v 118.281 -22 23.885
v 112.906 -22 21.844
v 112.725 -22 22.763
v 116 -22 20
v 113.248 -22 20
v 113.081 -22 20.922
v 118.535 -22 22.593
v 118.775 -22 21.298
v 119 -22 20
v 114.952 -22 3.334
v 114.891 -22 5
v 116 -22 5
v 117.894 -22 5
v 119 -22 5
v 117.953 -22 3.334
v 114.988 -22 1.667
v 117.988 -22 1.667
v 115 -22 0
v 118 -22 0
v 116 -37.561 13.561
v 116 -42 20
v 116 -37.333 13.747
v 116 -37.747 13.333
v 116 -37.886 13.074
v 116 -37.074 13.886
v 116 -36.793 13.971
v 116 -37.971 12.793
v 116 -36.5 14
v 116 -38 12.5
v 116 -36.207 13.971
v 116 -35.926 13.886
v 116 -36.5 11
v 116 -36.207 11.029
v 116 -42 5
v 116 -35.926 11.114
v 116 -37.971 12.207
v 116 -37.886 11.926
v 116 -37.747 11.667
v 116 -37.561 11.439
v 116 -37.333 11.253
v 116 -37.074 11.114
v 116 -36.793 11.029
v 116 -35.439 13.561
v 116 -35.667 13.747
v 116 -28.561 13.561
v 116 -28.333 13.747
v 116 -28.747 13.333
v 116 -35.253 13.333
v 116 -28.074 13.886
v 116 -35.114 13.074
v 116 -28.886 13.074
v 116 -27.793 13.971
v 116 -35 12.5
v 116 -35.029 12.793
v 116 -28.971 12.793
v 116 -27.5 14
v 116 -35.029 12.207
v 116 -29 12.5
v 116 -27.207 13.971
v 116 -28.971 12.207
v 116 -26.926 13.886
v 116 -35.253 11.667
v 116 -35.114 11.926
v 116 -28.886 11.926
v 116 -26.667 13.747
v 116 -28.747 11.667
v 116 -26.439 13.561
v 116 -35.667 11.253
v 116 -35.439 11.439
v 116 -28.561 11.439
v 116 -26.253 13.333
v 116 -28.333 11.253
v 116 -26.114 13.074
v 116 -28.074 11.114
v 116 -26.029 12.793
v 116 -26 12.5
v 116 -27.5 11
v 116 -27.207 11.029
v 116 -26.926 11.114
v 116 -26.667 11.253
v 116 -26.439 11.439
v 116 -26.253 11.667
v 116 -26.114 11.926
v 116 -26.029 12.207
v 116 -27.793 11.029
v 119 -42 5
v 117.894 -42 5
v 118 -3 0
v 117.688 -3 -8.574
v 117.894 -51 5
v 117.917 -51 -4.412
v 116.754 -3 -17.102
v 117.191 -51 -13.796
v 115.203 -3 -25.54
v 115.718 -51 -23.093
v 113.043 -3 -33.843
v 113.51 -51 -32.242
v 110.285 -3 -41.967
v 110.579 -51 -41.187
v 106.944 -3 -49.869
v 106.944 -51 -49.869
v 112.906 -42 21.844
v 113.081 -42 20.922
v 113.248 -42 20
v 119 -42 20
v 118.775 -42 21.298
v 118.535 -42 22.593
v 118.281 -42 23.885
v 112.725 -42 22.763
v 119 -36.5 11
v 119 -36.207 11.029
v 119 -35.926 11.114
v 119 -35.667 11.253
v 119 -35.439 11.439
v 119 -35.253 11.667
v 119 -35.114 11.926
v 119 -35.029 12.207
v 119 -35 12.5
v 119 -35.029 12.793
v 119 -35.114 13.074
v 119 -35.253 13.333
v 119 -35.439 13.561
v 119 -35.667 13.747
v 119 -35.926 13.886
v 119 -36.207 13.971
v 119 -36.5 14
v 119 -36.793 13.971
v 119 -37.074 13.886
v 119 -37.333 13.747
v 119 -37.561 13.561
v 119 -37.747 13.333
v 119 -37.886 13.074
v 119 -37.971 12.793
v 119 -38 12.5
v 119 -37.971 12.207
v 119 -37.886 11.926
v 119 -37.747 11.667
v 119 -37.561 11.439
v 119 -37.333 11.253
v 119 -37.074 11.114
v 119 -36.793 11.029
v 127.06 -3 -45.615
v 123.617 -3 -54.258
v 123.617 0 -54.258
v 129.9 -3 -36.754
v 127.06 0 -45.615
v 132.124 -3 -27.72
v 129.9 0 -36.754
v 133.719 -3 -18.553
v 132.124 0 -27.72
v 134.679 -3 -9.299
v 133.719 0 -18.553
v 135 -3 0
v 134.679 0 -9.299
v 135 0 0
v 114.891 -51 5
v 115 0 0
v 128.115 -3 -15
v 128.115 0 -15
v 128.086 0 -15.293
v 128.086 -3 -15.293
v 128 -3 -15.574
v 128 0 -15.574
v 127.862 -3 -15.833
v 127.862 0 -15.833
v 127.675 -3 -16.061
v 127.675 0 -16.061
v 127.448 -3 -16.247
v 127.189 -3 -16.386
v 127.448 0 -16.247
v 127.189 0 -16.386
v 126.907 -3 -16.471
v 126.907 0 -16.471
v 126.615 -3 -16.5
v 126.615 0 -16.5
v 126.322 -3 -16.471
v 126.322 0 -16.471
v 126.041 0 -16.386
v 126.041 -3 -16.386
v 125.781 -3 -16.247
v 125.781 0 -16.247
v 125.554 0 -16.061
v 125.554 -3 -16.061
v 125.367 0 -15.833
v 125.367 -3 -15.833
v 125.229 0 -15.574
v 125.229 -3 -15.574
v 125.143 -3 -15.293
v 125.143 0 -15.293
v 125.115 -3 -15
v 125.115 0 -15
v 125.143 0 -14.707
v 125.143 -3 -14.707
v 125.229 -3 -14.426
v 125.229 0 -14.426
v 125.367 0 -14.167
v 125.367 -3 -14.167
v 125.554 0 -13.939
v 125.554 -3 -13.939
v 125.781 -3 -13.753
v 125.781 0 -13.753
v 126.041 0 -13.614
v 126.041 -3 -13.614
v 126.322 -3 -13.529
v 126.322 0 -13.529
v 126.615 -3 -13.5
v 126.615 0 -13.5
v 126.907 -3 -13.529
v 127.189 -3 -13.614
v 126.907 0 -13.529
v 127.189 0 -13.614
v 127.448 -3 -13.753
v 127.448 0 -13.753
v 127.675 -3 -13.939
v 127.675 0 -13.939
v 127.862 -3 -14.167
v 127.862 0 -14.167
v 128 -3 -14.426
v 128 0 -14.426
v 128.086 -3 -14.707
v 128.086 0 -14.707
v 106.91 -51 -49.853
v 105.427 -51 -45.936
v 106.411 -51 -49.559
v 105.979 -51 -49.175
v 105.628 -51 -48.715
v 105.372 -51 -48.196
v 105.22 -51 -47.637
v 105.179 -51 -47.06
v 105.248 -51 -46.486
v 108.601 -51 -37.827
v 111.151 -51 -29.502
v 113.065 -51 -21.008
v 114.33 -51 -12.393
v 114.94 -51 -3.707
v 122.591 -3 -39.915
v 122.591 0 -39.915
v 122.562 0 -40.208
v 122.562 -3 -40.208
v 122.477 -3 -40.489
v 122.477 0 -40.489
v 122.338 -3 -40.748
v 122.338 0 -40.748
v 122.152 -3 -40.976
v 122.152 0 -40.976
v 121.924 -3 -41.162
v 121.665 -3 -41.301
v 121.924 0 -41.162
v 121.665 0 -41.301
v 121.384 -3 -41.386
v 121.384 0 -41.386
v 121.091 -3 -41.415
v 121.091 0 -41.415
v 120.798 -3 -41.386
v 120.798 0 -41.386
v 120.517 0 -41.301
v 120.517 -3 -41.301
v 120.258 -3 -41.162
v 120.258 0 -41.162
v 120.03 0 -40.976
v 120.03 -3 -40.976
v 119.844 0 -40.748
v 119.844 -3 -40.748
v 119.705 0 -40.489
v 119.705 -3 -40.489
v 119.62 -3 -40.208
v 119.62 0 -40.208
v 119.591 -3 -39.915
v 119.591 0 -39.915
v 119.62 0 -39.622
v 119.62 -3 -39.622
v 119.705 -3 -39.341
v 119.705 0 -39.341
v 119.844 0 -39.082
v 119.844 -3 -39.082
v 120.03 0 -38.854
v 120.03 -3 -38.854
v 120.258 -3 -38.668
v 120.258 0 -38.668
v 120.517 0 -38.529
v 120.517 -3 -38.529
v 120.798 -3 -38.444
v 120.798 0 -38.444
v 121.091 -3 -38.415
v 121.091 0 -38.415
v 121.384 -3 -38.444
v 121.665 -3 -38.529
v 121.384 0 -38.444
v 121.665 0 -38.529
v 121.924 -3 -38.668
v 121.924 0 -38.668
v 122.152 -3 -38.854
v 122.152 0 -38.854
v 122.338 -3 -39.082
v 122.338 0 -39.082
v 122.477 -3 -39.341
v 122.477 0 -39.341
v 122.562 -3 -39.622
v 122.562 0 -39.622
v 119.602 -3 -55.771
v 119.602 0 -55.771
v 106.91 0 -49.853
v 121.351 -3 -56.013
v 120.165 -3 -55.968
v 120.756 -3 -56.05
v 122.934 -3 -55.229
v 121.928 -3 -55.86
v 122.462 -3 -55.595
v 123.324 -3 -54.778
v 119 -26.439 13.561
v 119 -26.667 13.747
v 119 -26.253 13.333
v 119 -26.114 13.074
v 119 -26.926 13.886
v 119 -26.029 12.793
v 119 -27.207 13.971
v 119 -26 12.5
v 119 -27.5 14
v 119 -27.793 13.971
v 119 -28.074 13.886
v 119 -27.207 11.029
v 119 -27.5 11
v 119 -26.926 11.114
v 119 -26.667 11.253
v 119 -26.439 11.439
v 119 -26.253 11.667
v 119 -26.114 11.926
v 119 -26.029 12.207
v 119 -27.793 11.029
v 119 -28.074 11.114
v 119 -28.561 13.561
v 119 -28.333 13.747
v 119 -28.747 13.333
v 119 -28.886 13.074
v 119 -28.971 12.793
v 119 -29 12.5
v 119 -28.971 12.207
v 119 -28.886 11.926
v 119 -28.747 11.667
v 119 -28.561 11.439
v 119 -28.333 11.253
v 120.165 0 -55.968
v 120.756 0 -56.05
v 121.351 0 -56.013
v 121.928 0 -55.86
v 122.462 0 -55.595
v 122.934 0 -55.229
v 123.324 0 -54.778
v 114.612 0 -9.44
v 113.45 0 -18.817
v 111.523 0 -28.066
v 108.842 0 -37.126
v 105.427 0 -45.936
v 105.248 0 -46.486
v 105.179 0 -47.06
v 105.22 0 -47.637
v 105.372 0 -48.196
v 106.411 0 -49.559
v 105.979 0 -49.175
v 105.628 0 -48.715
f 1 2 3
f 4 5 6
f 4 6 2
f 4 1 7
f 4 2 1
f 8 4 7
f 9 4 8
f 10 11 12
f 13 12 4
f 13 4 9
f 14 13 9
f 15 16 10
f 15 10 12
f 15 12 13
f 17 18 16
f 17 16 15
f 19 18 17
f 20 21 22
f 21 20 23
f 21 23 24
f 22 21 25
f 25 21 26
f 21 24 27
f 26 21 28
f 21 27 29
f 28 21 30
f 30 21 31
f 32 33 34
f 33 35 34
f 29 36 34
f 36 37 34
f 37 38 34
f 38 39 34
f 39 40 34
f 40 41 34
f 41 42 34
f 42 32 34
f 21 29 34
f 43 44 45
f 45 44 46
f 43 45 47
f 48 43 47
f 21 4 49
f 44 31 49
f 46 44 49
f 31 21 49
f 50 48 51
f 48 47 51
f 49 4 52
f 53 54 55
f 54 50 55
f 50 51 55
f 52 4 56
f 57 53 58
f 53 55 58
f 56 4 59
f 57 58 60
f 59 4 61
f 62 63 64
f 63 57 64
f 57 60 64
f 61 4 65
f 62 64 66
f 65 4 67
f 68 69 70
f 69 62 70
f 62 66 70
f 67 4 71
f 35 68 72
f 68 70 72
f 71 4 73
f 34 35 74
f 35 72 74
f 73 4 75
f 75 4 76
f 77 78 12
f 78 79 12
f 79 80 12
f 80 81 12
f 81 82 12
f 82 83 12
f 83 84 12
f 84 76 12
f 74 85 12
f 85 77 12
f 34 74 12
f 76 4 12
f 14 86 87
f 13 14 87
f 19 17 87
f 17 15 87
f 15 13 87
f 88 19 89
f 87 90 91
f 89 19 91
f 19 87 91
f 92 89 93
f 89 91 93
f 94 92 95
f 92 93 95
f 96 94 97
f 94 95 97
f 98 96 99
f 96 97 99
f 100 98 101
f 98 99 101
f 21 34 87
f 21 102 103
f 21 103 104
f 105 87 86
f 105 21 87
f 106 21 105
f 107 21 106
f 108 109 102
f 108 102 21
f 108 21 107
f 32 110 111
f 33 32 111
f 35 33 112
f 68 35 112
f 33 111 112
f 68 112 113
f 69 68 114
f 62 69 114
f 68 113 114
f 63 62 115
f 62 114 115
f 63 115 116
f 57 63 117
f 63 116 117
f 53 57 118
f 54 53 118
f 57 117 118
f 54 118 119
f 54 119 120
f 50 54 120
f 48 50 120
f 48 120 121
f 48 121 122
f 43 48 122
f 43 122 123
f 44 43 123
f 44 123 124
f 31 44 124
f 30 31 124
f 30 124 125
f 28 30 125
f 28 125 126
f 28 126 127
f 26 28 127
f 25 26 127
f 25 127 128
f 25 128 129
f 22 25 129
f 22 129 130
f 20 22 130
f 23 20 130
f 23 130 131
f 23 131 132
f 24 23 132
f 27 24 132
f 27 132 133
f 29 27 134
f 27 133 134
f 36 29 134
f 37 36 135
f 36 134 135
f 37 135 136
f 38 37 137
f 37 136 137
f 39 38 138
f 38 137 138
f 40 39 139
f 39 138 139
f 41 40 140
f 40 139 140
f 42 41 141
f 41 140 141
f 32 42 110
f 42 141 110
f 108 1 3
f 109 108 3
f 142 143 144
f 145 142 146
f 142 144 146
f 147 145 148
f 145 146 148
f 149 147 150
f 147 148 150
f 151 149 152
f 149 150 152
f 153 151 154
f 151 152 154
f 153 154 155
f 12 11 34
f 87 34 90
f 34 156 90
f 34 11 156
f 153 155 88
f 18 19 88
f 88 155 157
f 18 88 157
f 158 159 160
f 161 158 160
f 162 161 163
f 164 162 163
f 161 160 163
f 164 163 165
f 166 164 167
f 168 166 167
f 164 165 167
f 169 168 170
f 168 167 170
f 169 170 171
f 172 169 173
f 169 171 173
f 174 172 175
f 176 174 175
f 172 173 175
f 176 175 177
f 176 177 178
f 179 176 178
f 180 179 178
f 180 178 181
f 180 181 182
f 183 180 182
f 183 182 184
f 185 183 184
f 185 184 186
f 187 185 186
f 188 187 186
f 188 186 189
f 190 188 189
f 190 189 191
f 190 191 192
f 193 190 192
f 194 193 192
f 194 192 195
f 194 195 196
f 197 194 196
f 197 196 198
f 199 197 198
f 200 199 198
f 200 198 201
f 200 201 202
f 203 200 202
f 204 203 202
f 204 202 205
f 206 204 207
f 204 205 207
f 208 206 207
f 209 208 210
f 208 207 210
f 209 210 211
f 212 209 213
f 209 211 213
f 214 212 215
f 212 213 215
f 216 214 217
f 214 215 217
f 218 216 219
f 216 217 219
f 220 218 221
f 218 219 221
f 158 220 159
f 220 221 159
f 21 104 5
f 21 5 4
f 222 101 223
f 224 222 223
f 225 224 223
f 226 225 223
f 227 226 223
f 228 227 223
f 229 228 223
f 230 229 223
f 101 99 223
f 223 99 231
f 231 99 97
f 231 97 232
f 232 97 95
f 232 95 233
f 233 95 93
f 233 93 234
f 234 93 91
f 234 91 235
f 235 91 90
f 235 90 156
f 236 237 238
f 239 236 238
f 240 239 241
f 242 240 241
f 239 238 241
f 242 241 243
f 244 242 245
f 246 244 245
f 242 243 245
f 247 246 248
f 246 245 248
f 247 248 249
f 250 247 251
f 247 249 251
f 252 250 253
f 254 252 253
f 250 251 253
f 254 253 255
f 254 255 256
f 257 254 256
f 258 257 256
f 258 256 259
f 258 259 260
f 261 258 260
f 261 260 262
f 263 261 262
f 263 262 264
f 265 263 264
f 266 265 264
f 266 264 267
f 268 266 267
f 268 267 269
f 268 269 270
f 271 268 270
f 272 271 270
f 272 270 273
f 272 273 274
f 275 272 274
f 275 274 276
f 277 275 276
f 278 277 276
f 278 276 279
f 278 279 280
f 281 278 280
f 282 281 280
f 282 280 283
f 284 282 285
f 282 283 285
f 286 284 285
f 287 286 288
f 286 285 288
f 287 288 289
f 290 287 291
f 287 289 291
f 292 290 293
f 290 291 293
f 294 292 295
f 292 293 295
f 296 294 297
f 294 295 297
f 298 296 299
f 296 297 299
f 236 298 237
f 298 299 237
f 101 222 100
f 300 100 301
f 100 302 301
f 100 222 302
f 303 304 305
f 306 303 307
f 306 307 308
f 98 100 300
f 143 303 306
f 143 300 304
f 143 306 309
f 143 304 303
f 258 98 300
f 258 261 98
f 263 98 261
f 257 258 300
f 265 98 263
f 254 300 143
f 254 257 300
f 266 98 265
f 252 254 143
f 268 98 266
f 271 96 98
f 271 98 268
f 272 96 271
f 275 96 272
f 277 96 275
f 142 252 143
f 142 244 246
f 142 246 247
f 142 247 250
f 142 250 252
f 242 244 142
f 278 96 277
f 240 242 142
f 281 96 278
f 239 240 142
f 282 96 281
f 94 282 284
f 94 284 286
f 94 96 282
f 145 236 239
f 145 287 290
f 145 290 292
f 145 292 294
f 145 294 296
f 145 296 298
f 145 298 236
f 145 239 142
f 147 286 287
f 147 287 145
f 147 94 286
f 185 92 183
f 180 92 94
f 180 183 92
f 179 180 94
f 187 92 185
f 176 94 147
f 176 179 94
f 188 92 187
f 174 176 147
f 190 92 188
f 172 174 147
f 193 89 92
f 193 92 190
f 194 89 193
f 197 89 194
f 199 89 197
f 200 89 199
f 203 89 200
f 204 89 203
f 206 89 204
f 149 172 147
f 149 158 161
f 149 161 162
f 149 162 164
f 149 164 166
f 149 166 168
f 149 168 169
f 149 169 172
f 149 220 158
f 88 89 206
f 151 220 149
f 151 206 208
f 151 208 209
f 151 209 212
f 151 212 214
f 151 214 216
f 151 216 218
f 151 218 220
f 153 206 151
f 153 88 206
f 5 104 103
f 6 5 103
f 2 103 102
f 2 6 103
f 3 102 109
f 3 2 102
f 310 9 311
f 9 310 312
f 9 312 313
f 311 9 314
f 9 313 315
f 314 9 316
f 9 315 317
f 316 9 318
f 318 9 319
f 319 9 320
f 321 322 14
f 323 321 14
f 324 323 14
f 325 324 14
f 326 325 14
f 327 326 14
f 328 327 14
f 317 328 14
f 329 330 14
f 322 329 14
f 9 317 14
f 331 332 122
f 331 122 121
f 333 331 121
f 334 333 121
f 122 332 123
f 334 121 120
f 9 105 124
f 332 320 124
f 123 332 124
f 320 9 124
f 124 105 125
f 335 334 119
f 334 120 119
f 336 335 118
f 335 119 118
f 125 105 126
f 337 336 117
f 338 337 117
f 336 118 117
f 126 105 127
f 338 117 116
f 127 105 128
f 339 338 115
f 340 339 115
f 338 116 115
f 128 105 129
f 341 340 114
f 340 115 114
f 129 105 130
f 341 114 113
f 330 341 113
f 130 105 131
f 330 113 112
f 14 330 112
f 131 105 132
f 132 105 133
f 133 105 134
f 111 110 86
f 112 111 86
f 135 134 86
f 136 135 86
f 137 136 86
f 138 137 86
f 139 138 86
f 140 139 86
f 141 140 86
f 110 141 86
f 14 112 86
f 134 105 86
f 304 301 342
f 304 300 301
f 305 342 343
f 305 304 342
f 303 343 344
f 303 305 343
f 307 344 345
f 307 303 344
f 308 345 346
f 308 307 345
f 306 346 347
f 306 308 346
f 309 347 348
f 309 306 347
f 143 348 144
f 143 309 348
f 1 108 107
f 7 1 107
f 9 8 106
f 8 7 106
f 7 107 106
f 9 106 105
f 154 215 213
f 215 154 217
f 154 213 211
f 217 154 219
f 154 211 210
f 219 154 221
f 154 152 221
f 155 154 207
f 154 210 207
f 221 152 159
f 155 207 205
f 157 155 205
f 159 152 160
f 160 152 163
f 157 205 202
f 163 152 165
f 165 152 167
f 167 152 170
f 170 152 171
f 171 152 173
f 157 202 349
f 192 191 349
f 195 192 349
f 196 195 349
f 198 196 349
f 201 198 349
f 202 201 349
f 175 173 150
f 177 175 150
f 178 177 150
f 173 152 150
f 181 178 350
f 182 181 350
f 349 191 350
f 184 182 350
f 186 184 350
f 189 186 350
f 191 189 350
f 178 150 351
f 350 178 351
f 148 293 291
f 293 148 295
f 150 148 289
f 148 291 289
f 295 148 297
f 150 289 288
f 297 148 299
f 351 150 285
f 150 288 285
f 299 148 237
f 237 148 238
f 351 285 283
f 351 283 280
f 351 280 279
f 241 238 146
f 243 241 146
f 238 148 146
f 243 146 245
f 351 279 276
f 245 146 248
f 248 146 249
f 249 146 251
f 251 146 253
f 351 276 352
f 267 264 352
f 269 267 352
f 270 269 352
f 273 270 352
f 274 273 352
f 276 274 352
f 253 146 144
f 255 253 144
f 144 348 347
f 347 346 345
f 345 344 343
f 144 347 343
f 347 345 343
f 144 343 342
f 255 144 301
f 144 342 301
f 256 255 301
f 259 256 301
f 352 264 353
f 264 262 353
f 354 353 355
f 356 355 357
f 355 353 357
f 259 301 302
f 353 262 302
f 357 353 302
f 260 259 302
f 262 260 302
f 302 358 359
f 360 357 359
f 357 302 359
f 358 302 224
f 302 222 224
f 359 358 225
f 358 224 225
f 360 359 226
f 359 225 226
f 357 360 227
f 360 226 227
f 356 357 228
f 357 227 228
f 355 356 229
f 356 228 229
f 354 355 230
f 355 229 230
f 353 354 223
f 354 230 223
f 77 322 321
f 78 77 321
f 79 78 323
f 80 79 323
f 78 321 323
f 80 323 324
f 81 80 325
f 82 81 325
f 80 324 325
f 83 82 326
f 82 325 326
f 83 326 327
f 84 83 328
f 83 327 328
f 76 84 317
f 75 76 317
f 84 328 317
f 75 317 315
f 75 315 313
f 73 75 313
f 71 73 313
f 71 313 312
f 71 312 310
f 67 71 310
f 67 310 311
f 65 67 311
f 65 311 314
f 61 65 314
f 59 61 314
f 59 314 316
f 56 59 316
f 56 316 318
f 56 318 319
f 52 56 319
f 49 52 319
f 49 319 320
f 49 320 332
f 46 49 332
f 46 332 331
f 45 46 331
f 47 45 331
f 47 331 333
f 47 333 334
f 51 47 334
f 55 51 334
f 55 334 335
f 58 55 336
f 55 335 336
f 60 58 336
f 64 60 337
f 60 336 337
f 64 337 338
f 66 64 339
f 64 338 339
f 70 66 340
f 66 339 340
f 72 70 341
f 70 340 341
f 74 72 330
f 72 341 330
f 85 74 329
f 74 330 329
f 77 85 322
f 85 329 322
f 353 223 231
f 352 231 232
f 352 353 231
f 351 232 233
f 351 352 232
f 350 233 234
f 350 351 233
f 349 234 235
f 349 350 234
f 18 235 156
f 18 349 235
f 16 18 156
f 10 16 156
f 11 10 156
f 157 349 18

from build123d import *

# Parameters (mm, degrees)
EXTRUDE_1_DEPTH      = 64
CUT_EXTRUDE_1_DEPTH  = 64
SKETCH_4_W           = 3
SKETCH_4_H           = 15
CUT_EXTRUDE_2_DEPTH  = 84
CUT_EXTRUDE_3_DEPTH  = 61
CUT_EXTRUDE_4_DEPTH  = 22
CUT_EXTRUDE_5_DEPTH  = 22
FILLET_1_R           = 3
SKETCH_8_R           = 1.5
CUT_EXTRUDE_8_DEPTH  = 10
CUT_EXTRUDE_9_DEPTH  = 13
SKETCH_10_R          = 1.5
CUT_EXTRUDE_10_DEPTH = 10
FILLET_2_R           = 3


with BuildPart() as part:
    # 草图2 → 凸台-拉伸1 (new body)
    with BuildSketch(Plane(origin=(0, 0, 0), x_dir=(1, 0, 0), z_dir=(0, 1, 0))):
        with BuildLine():
            Line((0, 0), (122.35155125, 57.053465335))
            ThreePointArc((122.35155125, 57.053465335), (134.052652215, 15.965163138), (132.328890593, -26.721989344))
            Line((132.328890593, -26.721989344), (0, 0))
        make_face()
    extrude(amount=-EXTRUDE_1_DEPTH)

    # 草图3 → 切除-拉伸1 (cut)
    with BuildSketch(Plane(origin=(0, 0, 0), x_dir=(1, 0, 0), z_dir=(0, 1, 0))):
        with BuildLine():
            Line((0, 0), (104.225395509, 48.6011001))
            ThreePointArc((104.225395509, 48.6011001), (114.193000035, 13.599953785), (112.724610505, -22.763176108))
            Line((112.724610505, -22.763176108), (0, 0))
        make_face()
    extrude(amount=-CUT_EXTRUDE_1_DEPTH, mode=Mode.SUBTRACT)

    # 草图4 → 切除-拉伸2 (cut)
    with BuildSketch(Plane(origin=(0, 0, 0), x_dir=(1, 0, 0), z_dir=(0, 1, 0))):
        with Locations((114.5, -12.5)):
            Rectangle(SKETCH_4_W, SKETCH_4_H)
    extrude(amount=-CUT_EXTRUDE_2_DEPTH, mode=Mode.SUBTRACT)

    # 草图5 → 切除-拉伸3 (cut)
    with BuildSketch(Plane.XZ.offset(64)):
        with BuildLine():
            Line((132.328890593, 26.721989344), (118.281412986, 23.885295518))
            ThreePointArc((118.281412986, 23.885295518), (118.656610088, 21.945589136), (119, 20))
            Line((119, 20), (119, 5))
            Line((119, 5), (117.894020205, 5))
            ThreePointArc((117.894020205, 5), (115.718279593, -23.092851014), (106.94431887, -49.868954885))
            Line((106.94431887, -49.868954885), (122.35155125, -57.053465335))
            ThreePointArc((122.35155125, -57.053465335), (134.052652215, -15.965163138), (132.328890593, 26.721989344))
        make_face()
    extrude(amount=-CUT_EXTRUDE_3_DEPTH, mode=Mode.SUBTRACT)

    # 草图6 → 切除-拉伸4 (cut)
    with BuildSketch(Plane(origin=(0, 0, 0), x_dir=(1, 0, 0), z_dir=(0, 1, 0))):
        with BuildLine():
            Line((135, 0), (115, 0))
            ThreePointArc((115, 0), (114.972810018, -2.500591226), (114.891252931, -5))
            Line((114.891252931, -5), (116, -5))
            Line((116, -5), (116, -20))
            Line((116, -20), (113.247516529, -20))
            ThreePointArc((113.247516529, -20), (112.994510197, -21.383186511), (112.724610505, -22.763176108))
            Line((112.724610505, -22.763176108), (132.328890593, -26.721989344))
            ThreePointArc((132.328890593, -26.721989344), (134.330562848, -13.427579268), (135, 0))
        make_face()
    extrude(amount=-CUT_EXTRUDE_4_DEPTH, mode=Mode.SUBTRACT)

    # 草图7 → 切除-拉伸5 (cut)
    with BuildSketch(Plane.XZ.offset(64)):
        with BuildLine():
            Line((116, 5), (119, 5))
            Line((119, 5), (119, 20))
            ThreePointArc((119, 20), (118.656610088, 21.945589136), (118.281412986, 23.885295518))
            Line((118.281412986, 23.885295518), (112.724610505, 22.763176108))
            ThreePointArc((112.724610505, 22.763176108), (112.994510197, 21.383186511), (113.247516529, 20))
            Line((113.247516529, 20), (116, 20))
            Line((116, 20), (116, 5))
        make_face()
    extrude(amount=-CUT_EXTRUDE_5_DEPTH, mode=Mode.SUBTRACT)

    # 圆角1
    fillet_1_edges = [part.edges().sort_by_distance(p)[0] for p in [
        (122.35155125, -1.5, -57.053465335),
    ]]
    fillet(fillet_1_edges, radius=FILLET_1_R)

    # 草图8 → 切除-拉伸8 (cut)
    with BuildSketch(Plane(origin=(119, 0, 0), x_dir=(0, 0, -1), z_dir=(1, 0, 0))):
        with Locations((-12.5, -27.5)):
            Circle(SKETCH_8_R)
        with Locations((-12.5, -36.5)):
            Circle(SKETCH_8_R)
    extrude(amount=-CUT_EXTRUDE_8_DEPTH, mode=Mode.SUBTRACT)

    # 草图9 → 切除-拉伸9 (cut)
    with BuildSketch(Plane.XZ.offset(64)):
        with BuildLine():
            Line((106.94431887, -49.868954885), (104.225395509, -48.6011001))
            ThreePointArc((104.225395509, -48.6011001), (112.788722348, -22.443353384), (114.891252931, 5))
            Line((114.891252931, 5), (117.894020205, 5))
            ThreePointArc((117.894020205, 5), (115.718279593, -23.092851014), (106.94431887, -49.868954885))
        make_face()
    extrude(amount=-CUT_EXTRUDE_9_DEPTH, mode=Mode.SUBTRACT)

    # 草图10 → 切除-拉伸10 (cut)
    with BuildSketch(Plane(origin=(0, 0, 0), x_dir=(1, 0, 0), z_dir=(0, 1, 0))):
        with Locations((121.091047045, 39.915013787)):
            Circle(SKETCH_10_R)
        with Locations((126.614572621, 15)):
            Circle(SKETCH_10_R)
    extrude(amount=-CUT_EXTRUDE_10_DEPTH, mode=Mode.SUBTRACT)

    # 圆角2
    fillet_2_edges = [part.edges().sort_by_distance(p)[0] for p in [
        (104.225395509, -25.5, -48.6011001),
    ]]
    fillet(fillet_2_edges, radius=FILLET_2_R)


solid = part.part
